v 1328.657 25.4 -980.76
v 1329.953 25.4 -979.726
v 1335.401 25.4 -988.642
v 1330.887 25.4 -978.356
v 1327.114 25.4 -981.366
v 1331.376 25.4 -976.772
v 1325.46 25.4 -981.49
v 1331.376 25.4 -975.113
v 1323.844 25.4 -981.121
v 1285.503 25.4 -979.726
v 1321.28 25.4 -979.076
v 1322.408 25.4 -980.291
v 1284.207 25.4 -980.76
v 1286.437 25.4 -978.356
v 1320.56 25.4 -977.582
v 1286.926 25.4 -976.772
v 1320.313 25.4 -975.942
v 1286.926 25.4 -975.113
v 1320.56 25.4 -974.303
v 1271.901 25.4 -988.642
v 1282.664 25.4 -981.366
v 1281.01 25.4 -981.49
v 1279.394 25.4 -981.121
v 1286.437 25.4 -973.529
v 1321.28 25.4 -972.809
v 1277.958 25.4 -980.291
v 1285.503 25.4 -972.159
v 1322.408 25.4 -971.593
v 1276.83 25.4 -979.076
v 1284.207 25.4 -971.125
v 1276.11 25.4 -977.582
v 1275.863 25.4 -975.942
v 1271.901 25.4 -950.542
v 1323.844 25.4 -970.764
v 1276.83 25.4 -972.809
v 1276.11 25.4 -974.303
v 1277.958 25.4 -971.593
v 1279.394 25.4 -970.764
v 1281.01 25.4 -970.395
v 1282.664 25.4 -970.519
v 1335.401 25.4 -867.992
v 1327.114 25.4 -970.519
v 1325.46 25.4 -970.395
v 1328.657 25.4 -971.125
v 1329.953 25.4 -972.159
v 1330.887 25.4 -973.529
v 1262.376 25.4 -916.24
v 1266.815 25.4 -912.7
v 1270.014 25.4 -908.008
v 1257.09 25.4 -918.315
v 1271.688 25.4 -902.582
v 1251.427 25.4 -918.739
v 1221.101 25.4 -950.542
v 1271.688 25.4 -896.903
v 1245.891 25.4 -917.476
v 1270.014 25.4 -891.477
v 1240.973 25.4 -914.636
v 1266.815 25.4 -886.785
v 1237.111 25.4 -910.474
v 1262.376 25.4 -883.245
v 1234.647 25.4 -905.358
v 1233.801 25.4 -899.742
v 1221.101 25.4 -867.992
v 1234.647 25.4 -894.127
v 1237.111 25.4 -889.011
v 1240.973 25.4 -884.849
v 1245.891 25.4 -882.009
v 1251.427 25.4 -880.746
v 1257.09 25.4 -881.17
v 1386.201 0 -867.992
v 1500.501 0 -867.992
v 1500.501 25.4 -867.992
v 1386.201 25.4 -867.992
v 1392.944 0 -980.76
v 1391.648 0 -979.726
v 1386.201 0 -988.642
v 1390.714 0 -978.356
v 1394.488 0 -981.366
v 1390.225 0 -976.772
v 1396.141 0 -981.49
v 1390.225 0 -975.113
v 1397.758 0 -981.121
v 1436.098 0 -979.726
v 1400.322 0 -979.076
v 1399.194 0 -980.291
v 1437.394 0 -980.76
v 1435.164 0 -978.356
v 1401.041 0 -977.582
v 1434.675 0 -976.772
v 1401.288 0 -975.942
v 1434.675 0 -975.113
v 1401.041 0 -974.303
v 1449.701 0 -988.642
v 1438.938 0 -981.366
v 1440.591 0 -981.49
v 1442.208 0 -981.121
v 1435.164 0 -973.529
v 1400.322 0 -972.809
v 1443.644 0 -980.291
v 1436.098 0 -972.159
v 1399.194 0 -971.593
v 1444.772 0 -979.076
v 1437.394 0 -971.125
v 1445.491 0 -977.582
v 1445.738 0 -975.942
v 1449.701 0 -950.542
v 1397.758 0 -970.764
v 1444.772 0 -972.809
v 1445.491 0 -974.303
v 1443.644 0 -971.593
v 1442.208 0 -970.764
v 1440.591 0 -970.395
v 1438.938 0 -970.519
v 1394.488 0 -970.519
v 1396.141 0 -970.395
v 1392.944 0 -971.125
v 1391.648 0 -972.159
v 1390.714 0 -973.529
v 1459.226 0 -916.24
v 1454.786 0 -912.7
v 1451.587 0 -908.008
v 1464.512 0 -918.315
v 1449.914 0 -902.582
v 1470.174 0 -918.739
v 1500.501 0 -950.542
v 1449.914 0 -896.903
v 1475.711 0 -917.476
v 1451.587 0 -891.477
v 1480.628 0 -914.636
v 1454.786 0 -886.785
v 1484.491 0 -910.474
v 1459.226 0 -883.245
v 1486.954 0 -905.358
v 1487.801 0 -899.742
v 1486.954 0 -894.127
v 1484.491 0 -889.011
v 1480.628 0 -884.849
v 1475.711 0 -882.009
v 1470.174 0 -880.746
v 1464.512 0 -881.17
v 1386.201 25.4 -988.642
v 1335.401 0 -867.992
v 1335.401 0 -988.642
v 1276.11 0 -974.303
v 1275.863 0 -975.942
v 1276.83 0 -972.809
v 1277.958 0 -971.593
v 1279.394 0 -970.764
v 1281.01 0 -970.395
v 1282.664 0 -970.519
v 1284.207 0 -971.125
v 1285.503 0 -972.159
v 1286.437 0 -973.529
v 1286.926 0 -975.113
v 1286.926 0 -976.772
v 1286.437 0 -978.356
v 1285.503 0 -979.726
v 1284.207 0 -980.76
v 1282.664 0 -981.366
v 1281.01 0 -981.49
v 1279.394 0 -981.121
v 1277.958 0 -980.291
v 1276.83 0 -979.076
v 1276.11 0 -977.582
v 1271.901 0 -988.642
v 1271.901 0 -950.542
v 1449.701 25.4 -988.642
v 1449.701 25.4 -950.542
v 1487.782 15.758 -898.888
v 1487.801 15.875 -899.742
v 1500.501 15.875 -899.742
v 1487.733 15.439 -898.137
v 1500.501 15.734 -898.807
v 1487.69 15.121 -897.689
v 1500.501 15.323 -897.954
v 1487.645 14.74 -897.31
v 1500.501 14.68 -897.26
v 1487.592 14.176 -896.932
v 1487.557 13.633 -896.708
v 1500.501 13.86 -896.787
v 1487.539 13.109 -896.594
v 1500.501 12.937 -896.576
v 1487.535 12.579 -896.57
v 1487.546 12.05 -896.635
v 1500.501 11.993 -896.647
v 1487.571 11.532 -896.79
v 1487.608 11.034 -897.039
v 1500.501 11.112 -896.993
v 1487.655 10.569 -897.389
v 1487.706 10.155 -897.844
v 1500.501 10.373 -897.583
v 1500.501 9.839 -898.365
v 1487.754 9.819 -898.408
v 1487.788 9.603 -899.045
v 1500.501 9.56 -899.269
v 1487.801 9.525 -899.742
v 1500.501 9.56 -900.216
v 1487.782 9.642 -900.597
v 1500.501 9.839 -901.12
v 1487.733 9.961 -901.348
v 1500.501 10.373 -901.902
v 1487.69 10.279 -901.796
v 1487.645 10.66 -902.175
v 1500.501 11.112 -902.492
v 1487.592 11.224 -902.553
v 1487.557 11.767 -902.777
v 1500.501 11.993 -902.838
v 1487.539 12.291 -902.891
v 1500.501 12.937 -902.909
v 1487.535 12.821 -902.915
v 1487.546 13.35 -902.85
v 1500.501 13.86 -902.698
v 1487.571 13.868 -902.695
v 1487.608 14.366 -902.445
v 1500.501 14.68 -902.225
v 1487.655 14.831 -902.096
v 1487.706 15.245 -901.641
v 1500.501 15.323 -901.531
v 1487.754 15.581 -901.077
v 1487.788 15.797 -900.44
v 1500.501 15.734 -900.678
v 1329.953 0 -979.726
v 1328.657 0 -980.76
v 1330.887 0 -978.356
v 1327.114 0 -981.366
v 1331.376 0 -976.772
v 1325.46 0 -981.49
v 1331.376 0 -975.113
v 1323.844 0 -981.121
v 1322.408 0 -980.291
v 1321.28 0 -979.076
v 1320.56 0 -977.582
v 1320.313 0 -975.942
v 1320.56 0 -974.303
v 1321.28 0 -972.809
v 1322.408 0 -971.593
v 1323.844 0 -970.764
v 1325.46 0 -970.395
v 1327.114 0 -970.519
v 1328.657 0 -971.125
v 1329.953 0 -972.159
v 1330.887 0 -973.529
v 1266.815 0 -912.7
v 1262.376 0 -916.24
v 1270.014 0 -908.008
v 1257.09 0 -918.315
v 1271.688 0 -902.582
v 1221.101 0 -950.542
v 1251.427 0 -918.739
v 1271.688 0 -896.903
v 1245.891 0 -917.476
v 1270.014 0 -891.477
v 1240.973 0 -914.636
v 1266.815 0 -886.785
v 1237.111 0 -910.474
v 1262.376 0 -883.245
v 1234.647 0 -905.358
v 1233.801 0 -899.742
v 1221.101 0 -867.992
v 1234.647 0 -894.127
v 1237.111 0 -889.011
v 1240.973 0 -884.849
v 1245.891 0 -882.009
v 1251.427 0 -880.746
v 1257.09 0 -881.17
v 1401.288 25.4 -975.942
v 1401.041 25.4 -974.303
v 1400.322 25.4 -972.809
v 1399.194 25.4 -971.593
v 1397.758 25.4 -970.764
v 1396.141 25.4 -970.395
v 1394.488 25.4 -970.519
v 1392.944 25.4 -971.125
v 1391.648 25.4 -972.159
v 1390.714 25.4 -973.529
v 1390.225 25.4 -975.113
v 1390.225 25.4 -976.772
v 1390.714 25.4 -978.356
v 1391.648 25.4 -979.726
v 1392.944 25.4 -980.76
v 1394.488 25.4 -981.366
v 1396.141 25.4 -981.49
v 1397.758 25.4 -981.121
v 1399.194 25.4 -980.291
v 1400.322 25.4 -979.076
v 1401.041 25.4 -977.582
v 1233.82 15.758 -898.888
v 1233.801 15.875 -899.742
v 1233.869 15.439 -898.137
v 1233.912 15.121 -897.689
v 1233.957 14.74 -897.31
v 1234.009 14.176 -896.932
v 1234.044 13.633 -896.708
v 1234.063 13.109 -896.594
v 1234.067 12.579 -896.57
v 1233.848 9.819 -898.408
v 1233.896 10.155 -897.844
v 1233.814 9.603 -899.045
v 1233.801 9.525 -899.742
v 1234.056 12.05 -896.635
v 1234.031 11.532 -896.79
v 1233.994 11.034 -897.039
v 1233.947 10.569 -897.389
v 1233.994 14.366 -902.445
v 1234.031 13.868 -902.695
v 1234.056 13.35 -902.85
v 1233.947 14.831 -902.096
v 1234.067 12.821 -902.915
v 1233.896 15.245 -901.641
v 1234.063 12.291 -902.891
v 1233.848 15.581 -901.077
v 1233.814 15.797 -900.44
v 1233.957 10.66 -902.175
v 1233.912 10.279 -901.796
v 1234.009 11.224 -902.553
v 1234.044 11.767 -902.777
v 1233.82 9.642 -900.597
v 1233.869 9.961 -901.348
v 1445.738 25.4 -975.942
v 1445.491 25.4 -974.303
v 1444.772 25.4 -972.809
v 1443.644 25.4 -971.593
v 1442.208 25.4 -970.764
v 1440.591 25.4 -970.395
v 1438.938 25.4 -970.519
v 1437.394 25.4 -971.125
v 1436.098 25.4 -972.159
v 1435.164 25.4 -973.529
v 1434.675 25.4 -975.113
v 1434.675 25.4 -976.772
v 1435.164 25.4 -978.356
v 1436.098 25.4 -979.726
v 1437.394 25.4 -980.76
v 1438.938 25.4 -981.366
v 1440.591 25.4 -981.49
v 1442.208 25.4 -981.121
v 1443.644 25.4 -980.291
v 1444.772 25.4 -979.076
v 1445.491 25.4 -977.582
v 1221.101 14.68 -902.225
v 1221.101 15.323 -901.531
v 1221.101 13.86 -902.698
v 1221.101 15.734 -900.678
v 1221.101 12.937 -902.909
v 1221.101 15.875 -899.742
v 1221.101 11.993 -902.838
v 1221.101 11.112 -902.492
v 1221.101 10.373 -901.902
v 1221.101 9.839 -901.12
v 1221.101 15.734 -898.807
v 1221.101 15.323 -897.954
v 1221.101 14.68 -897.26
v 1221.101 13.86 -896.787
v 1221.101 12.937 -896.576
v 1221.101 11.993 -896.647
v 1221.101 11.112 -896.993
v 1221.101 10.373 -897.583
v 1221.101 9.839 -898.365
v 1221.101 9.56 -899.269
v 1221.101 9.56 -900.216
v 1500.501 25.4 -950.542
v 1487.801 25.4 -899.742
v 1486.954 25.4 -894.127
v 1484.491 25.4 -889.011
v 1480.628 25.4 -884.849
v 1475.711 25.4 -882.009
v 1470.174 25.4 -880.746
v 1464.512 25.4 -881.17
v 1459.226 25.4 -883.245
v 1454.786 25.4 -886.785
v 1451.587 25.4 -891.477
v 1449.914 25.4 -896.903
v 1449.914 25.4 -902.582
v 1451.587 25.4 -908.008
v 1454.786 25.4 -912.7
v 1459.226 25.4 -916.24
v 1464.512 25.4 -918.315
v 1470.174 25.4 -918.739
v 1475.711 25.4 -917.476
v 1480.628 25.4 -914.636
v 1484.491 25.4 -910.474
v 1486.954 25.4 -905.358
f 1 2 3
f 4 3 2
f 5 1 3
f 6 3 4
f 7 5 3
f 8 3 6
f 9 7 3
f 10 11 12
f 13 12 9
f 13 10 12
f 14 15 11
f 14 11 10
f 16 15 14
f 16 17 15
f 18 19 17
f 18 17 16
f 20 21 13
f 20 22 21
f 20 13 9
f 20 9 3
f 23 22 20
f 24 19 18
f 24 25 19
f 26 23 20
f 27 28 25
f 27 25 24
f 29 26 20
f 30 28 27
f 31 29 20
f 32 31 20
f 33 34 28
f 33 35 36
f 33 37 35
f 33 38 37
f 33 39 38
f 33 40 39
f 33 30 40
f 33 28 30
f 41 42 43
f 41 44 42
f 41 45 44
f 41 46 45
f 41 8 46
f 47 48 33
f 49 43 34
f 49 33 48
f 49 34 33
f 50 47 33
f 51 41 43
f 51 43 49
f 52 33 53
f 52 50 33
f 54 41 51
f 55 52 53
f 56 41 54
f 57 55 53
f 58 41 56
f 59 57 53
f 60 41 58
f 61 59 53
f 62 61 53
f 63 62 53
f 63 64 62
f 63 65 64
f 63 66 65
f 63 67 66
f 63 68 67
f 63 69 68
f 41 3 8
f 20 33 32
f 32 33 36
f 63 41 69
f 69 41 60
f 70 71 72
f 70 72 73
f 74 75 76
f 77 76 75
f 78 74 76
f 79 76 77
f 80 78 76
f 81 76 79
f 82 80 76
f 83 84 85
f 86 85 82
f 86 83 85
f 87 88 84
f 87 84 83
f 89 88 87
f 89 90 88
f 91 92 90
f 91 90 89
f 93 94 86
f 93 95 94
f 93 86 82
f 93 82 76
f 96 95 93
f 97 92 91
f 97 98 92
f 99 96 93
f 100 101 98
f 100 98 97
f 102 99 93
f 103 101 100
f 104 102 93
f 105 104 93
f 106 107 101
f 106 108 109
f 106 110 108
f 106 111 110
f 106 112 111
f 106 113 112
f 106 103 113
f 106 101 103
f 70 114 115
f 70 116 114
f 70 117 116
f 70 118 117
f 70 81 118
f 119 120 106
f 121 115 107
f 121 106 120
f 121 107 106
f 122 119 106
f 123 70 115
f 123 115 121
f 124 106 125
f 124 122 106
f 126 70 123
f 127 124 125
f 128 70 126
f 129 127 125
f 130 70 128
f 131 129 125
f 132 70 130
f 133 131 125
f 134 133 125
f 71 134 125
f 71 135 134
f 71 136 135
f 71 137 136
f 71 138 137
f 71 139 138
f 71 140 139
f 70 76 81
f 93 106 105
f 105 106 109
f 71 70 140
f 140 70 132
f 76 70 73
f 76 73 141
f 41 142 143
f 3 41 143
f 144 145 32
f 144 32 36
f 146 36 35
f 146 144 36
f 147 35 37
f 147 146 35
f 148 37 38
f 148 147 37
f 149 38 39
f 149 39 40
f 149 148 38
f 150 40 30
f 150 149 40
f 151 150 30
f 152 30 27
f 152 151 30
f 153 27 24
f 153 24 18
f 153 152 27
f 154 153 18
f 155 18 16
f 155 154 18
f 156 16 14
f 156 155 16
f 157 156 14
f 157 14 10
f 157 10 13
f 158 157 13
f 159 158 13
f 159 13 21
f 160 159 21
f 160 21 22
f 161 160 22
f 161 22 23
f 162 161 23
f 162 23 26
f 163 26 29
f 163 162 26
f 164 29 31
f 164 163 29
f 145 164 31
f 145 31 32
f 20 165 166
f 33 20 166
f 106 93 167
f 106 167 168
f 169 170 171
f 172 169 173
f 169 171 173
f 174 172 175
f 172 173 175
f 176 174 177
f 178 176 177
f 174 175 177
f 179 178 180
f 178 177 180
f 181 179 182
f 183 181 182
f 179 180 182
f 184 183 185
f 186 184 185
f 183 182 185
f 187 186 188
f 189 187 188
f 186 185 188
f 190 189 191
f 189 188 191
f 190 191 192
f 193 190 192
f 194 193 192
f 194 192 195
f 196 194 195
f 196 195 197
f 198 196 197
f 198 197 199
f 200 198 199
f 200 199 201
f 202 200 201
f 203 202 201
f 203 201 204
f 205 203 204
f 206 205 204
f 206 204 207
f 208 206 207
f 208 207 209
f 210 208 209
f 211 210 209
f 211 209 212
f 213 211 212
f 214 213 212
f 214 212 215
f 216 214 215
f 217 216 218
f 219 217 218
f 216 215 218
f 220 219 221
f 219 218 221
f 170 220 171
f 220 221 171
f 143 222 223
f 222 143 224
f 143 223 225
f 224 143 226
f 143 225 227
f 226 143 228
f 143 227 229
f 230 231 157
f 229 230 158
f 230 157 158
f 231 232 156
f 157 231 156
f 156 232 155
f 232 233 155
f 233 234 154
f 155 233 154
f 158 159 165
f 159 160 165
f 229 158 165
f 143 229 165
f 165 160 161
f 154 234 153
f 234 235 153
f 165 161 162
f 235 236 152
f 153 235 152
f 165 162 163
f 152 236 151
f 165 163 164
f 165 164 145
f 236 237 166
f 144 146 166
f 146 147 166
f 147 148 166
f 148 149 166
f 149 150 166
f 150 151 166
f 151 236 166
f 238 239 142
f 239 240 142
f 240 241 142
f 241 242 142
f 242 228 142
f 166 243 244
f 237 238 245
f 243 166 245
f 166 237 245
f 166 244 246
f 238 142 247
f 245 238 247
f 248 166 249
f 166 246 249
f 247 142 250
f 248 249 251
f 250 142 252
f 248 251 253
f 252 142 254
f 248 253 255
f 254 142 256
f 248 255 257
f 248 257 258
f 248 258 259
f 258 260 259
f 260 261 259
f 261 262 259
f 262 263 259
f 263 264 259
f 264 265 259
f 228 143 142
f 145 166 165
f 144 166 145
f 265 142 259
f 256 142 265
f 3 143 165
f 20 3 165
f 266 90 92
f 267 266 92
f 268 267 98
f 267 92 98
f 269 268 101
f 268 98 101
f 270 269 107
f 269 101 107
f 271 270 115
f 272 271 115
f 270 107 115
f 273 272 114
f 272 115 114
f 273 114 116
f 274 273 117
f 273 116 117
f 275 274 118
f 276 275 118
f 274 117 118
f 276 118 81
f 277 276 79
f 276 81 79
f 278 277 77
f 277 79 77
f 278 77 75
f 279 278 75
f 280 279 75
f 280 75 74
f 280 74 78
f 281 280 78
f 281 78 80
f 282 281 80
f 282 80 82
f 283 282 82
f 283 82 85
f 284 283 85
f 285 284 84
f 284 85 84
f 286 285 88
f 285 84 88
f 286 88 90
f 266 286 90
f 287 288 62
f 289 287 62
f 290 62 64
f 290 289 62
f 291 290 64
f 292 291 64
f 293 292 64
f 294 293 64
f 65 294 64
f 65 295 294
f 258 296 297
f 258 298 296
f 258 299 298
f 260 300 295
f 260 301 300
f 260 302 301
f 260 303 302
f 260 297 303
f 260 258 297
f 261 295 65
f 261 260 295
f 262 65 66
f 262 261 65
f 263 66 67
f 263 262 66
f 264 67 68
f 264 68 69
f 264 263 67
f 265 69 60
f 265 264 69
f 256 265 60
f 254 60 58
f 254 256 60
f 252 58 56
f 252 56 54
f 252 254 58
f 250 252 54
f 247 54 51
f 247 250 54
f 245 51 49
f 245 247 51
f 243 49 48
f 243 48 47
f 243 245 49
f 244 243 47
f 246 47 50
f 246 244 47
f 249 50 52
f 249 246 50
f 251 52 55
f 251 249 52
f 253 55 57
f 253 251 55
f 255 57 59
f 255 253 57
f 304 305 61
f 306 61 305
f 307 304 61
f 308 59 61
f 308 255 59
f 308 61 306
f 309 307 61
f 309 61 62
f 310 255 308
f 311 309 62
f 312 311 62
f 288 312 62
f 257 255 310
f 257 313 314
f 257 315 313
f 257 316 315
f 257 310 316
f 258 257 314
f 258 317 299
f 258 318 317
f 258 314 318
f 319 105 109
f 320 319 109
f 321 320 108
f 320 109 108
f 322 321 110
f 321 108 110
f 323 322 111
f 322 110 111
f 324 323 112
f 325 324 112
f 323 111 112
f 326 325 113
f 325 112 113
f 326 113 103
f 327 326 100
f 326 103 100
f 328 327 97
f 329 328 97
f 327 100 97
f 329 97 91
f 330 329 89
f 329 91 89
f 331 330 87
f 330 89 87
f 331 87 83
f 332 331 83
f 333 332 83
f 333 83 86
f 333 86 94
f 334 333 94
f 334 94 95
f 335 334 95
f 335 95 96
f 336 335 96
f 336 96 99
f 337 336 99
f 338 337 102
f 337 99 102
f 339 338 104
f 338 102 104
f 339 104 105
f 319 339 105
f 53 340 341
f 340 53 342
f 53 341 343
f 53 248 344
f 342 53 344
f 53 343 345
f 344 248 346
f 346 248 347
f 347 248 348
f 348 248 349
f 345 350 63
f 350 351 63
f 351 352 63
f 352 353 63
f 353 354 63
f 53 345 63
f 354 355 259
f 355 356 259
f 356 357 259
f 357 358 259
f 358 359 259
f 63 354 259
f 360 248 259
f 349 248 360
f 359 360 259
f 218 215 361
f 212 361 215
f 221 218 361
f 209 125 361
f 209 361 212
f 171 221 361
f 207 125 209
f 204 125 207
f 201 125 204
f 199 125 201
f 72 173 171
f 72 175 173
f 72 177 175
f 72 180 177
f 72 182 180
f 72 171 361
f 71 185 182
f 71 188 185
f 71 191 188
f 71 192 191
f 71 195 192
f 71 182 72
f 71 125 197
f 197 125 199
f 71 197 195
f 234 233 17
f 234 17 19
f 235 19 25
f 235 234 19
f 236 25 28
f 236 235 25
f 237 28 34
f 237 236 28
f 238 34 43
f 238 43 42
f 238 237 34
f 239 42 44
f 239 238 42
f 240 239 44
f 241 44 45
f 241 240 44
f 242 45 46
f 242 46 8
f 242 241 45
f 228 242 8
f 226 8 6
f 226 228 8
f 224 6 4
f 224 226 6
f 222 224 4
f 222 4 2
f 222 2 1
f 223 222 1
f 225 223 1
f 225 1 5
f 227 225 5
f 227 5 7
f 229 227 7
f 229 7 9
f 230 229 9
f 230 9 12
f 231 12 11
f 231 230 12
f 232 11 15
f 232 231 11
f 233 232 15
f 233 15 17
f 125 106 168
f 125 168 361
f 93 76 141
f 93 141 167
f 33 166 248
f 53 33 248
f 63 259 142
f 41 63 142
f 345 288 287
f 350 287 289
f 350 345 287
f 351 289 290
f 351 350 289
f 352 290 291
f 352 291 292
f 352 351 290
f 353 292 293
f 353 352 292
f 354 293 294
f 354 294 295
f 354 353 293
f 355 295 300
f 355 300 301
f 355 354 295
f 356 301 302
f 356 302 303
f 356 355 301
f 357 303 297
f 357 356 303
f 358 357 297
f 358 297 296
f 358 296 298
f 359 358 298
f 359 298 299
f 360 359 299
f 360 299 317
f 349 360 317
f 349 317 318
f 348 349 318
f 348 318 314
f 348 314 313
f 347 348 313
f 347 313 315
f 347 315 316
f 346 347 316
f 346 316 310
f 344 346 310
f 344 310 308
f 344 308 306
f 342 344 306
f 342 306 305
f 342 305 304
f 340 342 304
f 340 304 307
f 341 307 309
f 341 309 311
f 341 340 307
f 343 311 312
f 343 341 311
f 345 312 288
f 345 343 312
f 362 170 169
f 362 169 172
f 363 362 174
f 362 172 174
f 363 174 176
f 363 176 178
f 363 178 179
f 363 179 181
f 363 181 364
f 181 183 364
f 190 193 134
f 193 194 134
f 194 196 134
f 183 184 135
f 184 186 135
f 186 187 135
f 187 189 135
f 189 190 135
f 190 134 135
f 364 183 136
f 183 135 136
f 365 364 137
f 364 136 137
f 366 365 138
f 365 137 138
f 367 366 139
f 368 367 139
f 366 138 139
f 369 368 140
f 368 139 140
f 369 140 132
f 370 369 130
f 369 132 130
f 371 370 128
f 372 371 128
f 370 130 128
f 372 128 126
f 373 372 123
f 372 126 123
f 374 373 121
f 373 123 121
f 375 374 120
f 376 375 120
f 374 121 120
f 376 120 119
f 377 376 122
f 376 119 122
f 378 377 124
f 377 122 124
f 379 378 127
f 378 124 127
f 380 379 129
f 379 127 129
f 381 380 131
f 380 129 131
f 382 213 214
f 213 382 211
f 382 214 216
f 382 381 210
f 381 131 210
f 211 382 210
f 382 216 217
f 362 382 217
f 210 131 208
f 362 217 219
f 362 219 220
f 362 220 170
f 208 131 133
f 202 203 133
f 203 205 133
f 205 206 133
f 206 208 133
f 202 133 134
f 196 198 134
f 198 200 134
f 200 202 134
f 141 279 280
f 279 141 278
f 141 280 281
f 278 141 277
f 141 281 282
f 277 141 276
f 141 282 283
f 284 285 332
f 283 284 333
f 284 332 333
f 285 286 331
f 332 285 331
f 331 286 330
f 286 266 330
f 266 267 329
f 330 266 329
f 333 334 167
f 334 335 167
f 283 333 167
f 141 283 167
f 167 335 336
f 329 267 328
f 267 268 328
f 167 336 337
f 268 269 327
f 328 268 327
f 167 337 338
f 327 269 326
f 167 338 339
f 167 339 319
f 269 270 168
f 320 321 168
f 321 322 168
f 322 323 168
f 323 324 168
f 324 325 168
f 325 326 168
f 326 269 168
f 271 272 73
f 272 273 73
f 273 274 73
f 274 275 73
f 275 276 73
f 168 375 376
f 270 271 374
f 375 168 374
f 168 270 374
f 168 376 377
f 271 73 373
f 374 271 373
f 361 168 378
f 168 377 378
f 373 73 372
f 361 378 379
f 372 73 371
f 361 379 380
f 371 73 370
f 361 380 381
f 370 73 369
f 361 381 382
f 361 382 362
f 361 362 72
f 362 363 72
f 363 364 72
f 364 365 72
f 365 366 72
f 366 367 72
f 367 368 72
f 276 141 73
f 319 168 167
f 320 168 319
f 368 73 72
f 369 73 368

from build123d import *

# Parameters (mm, degrees)
F0_R     = 5.5626
F0_R_2   = 19.05
F1_DEPTH = 25.4
F2_R     = 3.175
F3_DEPTH = 25.4


with BuildPart() as f1:
    # F0 (on Front) → F1 (new body)
    with BuildSketch(Plane.XZ):
        Polygon((1449.700764, -867.992472), (1386.200764, -867.992472), (1386.200764, -988.642472), (1449.700764, -988.642472), (1449.700764, -950.542472), (1500.500764, -950.542472), (1500.500764, -867.992472), align=None)
        with Locations((1395.725764, -975.942472)):
            Circle(F0_R, mode=Mode.SUBTRACT)
        with Locations((1440.175764, -975.942472)):
            Circle(F0_R, mode=Mode.SUBTRACT)
        with Locations((1468.750764, -899.742472)):
            Circle(F0_R_2, mode=Mode.SUBTRACT)
    extrude(amount=-F1_DEPTH)

    # F2 (on face) → F3 (cut)
    with BuildSketch(Plane.YZ.offset(1500.500764)):
        with Locations((12.7, -899.742472)):
            Circle(F2_R)
    extrude(amount=-F3_DEPTH, mode=Mode.SUBTRACT)


with BuildPart() as f5_1:
    # F5: instance of F1
    add(f1.part.mirror(Plane(origin=(1360.800764, 12.7, -928.317472), x_dir=(0, -1, 0), z_dir=(-1, 0, 0))))


solid = Compound([f1.part, f5_1.part])
